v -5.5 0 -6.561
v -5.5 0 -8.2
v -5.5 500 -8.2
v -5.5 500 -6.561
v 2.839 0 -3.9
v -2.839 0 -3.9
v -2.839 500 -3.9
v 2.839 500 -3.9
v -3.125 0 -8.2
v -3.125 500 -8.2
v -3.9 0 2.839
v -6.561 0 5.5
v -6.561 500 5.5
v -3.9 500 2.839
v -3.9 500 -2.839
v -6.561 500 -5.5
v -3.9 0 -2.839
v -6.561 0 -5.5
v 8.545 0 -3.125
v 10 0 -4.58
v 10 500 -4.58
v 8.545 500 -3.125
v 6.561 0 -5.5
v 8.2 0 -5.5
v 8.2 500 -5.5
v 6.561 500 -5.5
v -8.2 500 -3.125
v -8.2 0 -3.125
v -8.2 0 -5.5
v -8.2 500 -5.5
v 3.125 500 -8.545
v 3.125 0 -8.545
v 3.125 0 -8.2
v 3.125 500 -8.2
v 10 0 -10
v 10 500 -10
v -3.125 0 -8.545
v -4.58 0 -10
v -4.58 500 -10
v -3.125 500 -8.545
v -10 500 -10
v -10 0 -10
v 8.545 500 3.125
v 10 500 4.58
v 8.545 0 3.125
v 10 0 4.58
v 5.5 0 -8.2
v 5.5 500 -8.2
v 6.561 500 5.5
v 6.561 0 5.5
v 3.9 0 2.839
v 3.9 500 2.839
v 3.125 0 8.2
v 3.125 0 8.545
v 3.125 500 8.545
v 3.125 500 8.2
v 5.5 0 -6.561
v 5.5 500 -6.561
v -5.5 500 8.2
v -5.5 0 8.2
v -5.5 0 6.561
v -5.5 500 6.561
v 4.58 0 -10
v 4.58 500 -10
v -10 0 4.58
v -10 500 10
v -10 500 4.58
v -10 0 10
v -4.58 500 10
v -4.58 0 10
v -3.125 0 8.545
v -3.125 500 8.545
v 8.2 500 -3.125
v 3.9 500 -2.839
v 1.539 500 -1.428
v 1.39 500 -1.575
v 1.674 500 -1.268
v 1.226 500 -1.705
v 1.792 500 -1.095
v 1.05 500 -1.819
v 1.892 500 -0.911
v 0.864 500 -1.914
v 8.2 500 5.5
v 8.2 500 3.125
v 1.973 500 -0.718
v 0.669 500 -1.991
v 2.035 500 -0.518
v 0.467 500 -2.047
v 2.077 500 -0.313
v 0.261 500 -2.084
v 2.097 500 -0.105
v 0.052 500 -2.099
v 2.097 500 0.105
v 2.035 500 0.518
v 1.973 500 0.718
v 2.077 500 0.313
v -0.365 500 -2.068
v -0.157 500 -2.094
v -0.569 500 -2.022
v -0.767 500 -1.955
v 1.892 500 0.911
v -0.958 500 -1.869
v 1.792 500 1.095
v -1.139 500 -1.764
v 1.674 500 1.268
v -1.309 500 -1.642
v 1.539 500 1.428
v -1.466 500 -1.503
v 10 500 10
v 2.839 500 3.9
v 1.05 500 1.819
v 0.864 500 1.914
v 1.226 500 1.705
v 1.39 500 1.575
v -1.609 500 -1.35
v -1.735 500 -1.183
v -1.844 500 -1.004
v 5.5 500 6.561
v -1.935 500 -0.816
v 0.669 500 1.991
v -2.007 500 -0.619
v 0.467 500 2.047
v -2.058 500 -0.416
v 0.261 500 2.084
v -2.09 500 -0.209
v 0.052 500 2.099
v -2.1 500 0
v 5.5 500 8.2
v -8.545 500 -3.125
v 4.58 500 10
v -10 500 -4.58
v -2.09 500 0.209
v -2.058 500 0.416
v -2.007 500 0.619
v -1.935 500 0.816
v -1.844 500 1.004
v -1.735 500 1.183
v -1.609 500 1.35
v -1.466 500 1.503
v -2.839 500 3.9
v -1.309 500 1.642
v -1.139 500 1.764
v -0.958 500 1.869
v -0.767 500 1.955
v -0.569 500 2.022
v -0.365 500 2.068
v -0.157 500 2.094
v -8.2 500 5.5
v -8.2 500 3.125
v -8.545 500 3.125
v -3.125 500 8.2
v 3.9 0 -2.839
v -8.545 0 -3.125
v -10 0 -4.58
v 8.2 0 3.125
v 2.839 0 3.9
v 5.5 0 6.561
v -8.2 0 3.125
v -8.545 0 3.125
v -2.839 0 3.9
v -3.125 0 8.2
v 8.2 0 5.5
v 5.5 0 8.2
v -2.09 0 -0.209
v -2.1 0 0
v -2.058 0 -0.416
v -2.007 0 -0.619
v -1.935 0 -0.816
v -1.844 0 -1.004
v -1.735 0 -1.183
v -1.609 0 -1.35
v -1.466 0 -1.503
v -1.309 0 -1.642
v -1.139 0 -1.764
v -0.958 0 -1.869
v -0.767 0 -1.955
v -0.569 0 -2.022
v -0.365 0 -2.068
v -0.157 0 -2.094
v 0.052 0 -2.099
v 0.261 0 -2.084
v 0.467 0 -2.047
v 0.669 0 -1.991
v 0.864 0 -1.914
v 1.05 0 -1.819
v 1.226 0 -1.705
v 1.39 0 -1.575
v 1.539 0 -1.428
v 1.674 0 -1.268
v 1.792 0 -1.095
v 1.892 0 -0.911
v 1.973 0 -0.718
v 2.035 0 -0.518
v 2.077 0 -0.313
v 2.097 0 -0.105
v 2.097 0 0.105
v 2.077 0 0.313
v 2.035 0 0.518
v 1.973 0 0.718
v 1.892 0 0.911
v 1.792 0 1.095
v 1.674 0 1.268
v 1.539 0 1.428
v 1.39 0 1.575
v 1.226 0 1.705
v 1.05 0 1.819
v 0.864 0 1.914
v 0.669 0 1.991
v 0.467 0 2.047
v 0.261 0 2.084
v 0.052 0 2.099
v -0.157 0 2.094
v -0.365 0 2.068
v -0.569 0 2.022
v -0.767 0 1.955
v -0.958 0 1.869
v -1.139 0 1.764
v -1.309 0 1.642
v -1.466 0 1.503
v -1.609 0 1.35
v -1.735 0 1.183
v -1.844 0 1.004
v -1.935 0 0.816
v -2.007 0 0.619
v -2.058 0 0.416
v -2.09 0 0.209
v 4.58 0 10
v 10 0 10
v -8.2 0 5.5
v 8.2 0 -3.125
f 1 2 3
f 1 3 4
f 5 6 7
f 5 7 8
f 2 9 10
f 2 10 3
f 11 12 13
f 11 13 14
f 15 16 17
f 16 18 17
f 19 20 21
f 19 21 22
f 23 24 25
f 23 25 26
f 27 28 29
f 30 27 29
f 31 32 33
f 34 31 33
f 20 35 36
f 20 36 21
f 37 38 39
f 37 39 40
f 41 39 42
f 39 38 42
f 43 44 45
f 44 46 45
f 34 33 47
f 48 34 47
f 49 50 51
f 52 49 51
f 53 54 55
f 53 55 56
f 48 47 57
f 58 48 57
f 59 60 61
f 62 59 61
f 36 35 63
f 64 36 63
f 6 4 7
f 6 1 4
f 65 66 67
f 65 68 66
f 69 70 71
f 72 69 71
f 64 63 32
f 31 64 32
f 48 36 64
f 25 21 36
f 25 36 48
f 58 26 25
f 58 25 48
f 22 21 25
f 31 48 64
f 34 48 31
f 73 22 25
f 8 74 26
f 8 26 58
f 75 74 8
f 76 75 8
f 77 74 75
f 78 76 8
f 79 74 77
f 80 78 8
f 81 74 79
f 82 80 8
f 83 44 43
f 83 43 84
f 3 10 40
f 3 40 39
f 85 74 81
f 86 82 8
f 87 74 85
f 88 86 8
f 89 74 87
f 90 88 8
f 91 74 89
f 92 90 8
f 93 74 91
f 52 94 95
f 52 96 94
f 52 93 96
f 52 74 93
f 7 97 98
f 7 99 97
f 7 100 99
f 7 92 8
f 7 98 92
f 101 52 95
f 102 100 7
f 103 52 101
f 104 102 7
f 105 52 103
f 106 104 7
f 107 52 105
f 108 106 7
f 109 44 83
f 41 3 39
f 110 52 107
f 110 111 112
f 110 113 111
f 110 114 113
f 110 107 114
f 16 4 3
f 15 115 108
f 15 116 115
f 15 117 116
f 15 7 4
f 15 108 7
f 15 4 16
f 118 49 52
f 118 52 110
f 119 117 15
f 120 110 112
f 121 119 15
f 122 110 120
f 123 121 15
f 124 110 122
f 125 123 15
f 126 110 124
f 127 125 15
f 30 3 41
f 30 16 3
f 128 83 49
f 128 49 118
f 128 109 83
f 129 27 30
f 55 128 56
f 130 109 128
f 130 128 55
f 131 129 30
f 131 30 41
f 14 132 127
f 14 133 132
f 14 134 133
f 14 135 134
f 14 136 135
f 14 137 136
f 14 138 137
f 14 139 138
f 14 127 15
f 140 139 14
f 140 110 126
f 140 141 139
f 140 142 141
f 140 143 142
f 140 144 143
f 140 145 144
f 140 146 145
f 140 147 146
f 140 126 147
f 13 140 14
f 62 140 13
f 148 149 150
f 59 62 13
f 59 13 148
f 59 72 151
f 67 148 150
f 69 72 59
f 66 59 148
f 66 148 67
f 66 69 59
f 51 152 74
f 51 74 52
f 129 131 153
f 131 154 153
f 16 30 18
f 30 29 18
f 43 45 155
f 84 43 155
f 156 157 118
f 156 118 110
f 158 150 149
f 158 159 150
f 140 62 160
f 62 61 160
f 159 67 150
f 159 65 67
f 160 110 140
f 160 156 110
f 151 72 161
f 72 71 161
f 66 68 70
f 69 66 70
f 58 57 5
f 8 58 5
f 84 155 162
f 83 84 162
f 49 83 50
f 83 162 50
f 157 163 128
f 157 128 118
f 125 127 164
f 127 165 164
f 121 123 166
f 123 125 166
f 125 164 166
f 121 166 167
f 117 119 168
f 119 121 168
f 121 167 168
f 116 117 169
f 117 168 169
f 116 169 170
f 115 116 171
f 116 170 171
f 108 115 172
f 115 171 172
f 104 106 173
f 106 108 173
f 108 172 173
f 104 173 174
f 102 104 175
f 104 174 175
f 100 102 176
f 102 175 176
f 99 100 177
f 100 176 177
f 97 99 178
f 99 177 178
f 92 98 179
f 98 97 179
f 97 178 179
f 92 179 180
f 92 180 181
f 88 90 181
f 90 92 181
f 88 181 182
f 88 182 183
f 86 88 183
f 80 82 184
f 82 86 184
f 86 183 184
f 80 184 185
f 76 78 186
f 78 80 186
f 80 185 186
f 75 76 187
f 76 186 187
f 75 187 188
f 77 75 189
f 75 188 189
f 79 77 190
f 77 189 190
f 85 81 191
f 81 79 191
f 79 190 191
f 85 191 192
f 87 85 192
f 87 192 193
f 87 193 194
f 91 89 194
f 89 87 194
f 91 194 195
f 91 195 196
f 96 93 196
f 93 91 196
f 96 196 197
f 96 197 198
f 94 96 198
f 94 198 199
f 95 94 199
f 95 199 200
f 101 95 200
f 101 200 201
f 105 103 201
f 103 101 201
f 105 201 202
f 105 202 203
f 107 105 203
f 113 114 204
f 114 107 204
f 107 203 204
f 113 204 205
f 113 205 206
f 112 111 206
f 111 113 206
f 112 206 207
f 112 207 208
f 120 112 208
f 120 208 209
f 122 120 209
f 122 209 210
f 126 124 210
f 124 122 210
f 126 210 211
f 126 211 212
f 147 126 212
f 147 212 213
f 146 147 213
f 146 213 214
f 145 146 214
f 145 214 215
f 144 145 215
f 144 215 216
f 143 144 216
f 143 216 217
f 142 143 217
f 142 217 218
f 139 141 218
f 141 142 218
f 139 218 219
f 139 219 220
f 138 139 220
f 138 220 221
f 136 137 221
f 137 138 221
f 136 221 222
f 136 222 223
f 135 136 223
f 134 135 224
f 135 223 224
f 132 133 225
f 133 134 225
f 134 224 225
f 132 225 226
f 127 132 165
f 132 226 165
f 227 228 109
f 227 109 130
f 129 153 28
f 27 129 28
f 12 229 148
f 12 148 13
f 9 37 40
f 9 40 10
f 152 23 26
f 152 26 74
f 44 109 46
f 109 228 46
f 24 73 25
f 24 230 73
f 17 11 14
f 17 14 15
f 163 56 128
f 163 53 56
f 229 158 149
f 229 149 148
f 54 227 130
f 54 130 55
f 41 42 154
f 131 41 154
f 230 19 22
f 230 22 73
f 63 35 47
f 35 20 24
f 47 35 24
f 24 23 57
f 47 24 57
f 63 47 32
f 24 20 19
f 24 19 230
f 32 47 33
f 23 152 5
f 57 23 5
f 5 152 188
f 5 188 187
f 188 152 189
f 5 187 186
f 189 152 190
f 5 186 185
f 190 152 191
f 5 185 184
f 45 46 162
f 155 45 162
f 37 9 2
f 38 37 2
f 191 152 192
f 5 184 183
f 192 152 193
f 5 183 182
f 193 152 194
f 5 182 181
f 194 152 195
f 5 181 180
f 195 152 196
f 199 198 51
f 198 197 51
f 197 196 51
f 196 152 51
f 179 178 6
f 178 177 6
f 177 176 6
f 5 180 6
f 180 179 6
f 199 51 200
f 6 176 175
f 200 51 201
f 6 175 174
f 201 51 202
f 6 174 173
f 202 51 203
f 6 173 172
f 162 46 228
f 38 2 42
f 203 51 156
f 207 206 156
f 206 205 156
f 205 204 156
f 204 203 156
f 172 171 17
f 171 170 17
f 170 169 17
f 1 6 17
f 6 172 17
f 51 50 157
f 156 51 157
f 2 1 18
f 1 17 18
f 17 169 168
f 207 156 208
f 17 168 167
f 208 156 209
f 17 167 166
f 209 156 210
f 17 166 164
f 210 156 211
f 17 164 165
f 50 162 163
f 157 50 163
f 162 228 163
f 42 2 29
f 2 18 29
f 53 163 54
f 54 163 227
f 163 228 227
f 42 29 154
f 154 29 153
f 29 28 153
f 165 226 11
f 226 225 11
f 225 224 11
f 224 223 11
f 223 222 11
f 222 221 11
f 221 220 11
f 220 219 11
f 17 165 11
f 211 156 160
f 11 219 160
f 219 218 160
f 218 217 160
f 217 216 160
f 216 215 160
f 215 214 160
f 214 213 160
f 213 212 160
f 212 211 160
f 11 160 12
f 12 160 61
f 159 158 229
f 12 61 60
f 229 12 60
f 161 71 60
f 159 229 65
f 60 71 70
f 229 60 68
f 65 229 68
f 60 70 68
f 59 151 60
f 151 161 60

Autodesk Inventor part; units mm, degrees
sketch "Sketch1" plane through (0, 0, 0) normal (0, 1, 0) x (-1, 0, 0)
  circle A0 centre (0, 0) radius 2.1
  line L0 (10, 10) -> (-10, 10) construction
  line L1 (-10, 10) -> (-10, -10) construction
  line L2 (-10, -10) -> (10, -10)
  line L3 (10, -10) -> (10, 10) construction
  line L4 (10, 10) -> (-10, -10) construction
  line L5 (-10, 10) -> (10, -10) construction
  line L6 (8.2, 10) -> (8.2, -10) construction
  line L7 (3.9, 10) -> (3.9, -10) construction
  line L8 (8.2, 3.125) -> (8.2, -3.125) construction
  line L9 (10, 4.58) -> (10, -4.58) construction
  line L10 (8.2, 5.5) -> (8.2, -5.5) construction
  line L11 (3.3697, 4.4303) -> (4.4303, 3.3697) construction
  line L12 (10, 10) -> (10, 4.58)
  line L13 (10, 4.58) -> (8.545, 3.125)
  line L14 (8.545, 3.125) -> (8.2, 3.125)
  line L15 (8.2, 3.125) -> (8.2, 5.5)
  line L16 (14, 0) -> (-14, 0) construction
  line L17 (8.2, 5.5) -> (6.5607, 5.5)
  line L18 (6.5607, 5.5) -> (3.9, 2.8393)
  line L19 (3.9, 2.8393) -> (3.9, 0)
  line L20 (10, -10) -> (10, -4.58)
  line L21 (10, -4.58) -> (8.545, -3.125)
  line L22 (8.545, -3.125) -> (8.2, -3.125)
  line L23 (8.2, -3.125) -> (8.2, -5.5)
  line L24 (8.2, -5.5) -> (6.5607, -5.5)
  line L25 (6.5607, -5.5) -> (3.9, -2.8393)
  line L26 (3.9, -2.8393) -> (3.9, 0)
  line L27 (-10, 10) -> (-4.58, 10)
  line L28 (-4.58, 10) -> (-3.125, 8.545)
  line L29 (-3.125, 8.2) -> (-5.5, 8.2)
  line L30 (-5.5, 8.2) -> (-5.5, 6.5607)
  line L31 (-5.5, 6.5607) -> (-2.8393, 3.9)
  line L32 (-2.8393, 3.9) -> (0, 3.9)
  line L33 (2.8393, 3.9) -> (0, 3.9)
  line L34 (5.5, 6.5607) -> (2.8393, 3.9)
  line L35 (5.5, 8.2) -> (5.5, 6.5607)
  line L36 (3.125, 8.2) -> (5.5, 8.2)
  line L37 (3.125, 8.545) -> (3.125, 8.2)
  line L38 (4.58, 10) -> (3.125, 8.545)
  line L39 (-3.125, 8.545) -> (-3.125, 8.2)
  line L40 (10, 10) -> (4.58, 10)
  line L41 (-10, -10) -> (-10, -4.58)
  line L42 (-10, -4.58) -> (-8.545, -3.125)
  line L43 (-8.2, -3.125) -> (-8.2, -5.5)
  line L44 (-8.2, -5.5) -> (-6.5607, -5.5)
  line L45 (-6.5607, -5.5) -> (-3.9, -2.8393)
  line L46 (-3.9, -2.8393) -> (-3.9, 0)
  line L47 (-3.9, 2.8393) -> (-3.9, 0)
  line L48 (-6.5607, 5.5) -> (-3.9, 2.8393)
  line L49 (-8.2, 5.5) -> (-6.5607, 5.5)
  line L50 (-8.2, 3.125) -> (-8.2, 5.5)
  line L51 (-8.545, 3.125) -> (-8.2, 3.125)
  line L52 (-10, 4.58) -> (-8.545, 3.125)
  line L53 (-8.545, -3.125) -> (-8.2, -3.125)
  line L54 (-10, 10) -> (-10, 4.58)
  line L55 (10, -10) -> (4.58, -10) construction
  line L56 (4.58, -10) -> (3.125, -8.545)
  line L57 (3.125, -8.2) -> (5.5, -8.2)
  line L58 (5.5, -8.2) -> (5.5, -6.5607)
  line L59 (5.5, -6.5607) -> (2.8393, -3.9)
  line L60 (2.8393, -3.9) -> (0, -3.9)
  line L61 (-2.8393, -3.9) -> (0, -3.9)
  line L62 (-5.5, -6.5607) -> (-2.8393, -3.9)
  line L63 (-5.5, -8.2) -> (-5.5, -6.5607)
  line L64 (-3.125, -8.2) -> (-5.5, -8.2)
  line L65 (-3.125, -8.545) -> (-3.125, -8.2)
  line L66 (-4.58, -10) -> (-3.125, -8.545)
  line L67 (3.125, -8.545) -> (3.125, -8.2)
  line L68 (-10, -10) -> (-4.58, -10) construction
  line L69 (5.5, -6.5607) -> (6.2393, -7.3)
  line L70 (6.2393, -7.3) -> (8.2, -7.3)
  line L71 (0, -10) -> (0, -9) construction
  line L72 (-5.5, -6.5607) -> (-6.2393, -7.3)
  line L73 (-6.2393, -7.3) -> (-8.2, -7.3)
  line L74 (8.2, -7.3) -> (8.2, -10)
  line L75 (-8.2, -7.3) -> (-8.2, -10)
  circle A1 centre (0, -20) radius 2.1
  line L76 (10, -30) -> (10, -24.58)
  line L77 (10, -24.58) -> (8.545, -23.125)
  line L78 (8.545, -23.125) -> (8.2, -23.125)
  line L79 (8.2, -23.125) -> (8.2, -25.5)
  line L80 (8.2, -25.5) -> (6.5607, -25.5)
  line L81 (6.5607, -25.5) -> (3.9, -22.8393)
  line L82 (3.9, -22.8393) -> (3.9, -20)
  line L83 (10, -10) -> (10, -15.42)
  line L84 (10, -15.42) -> (8.545, -16.875)
  line L85 (8.2, -16.875) -> (8.2, -14.5)
  line L86 (8.2, -14.5) -> (6.5607, -14.5)
  line L87 (6.5607, -14.5) -> (3.9, -17.1607)
  line L88 (3.9, -17.1607) -> (3.9, -20)
  line L89 (-10, -30) -> (-4.58, -30)
  line L90 (-4.58, -30) -> (-3.125, -28.545)
  line L91 (-3.125, -28.2) -> (-5.5, -28.2)
  line L92 (-5.5, -28.2) -> (-5.5, -26.5607)
  line L93 (-5.5, -26.5607) -> (-2.8393, -23.9)
  line L94 (-2.8393, -23.9) -> (0, -23.9)
  line L95 (2.8393, -23.9) -> (0, -23.9)
  line L96 (5.5, -26.5607) -> (2.8393, -23.9)
  line L97 (5.5, -28.2) -> (5.5, -26.5607)
  line L98 (3.125, -28.2) -> (5.5, -28.2)
  line L99 (3.125, -28.545) -> (3.125, -28.2)
  line L100 (4.58, -30) -> (3.125, -28.545)
  line L101 (-3.125, -28.545) -> (-3.125, -28.2)
  line L102 (10, -30) -> (4.58, -30)
  line L103 (-10, -10) -> (-10, -15.42)
  line L104 (-10, -15.42) -> (-8.545, -16.875)
  line L105 (-8.2, -16.875) -> (-8.2, -14.5)
  line L106 (-8.2, -14.5) -> (-6.5607, -14.5)
  line L107 (-6.5607, -14.5) -> (-3.9, -17.1607)
  line L108 (-3.9, -17.1607) -> (-3.9, -20)
  line L109 (-3.9, -22.8393) -> (-3.9, -20)
  line L110 (-6.5607, -25.5) -> (-3.9, -22.8393)
  line L111 (-8.2, -25.5) -> (-6.5607, -25.5)
  line L112 (-8.2, -23.125) -> (-8.2, -25.5)
  line L113 (-8.545, -23.125) -> (-8.2, -23.125)
  line L114 (-10, -24.58) -> (-8.545, -23.125)
  line L115 (-8.545, -16.875) -> (-8.2, -16.875)
  line L116 (-10, -30) -> (-10, -24.58)
  line L117 (5.5, -13.4393) -> (2.8393, -16.1)
  line L118 (2.8393, -16.1) -> (0, -16.1)
  line L119 (-2.8393, -16.1) -> (0, -16.1)
  line L120 (-5.5, -13.4393) -> (-2.8393, -16.1)
  line L121 (5.5, -13.4393) -> (6.2393, -12.7)
  line L122 (6.2393, -12.7) -> (8.2, -12.7)
  line L123 (-5.5, -13.4393) -> (-6.2393, -12.7)
  line L124 (-6.2393, -12.7) -> (-8.2, -12.7)
  line L125 (8.2, -12.7) -> (8.2, -10)
  line L126 (-8.2, -12.7) -> (-8.2, -10)
  line L127 (8.545, -16.875) -> (8.2, -16.875)
  point P0 (10, 0)
  point P1 (8.2, 0)
  point P2 (3.9, 3.9)
  point P3 (-3.3697, 4.4303)
  point P4 (-4.4303, -3.3697)
  point P5 (3.3697, -4.4303)
  dimension "d0" = 4.2
  dimension "d1" = 20
  dimension "d2" = 20
  dimension "d3" = 1.8
  dimension "d4" = 4.3
  dimension "d5" = 6.25
  dimension "d6" = 9.16
  dimension "d7" = 11
  dimension "d8" = 1.5
  dimension "d9" = 45
  dimension "d12" = 360
  dimension "d17" = 1.8
  dimension "d18" = 1
extrude "Extrusion1" add sketch "Sketch1" along normal blind 500 contours L41 L42 L53 L43 L44 L45 L46 L47 L48 L49 L50 L51 L52 L54 L27 L28 L39 L29 L30 L31 L32 L33 L34 L35 L36 L37 L38 L40 L12 L13 L14 L15 L17 L18 L19 L26 L25 L24 L23 L22 L21 L20 L2 L74 L70 L69 L59 L60 L61 L62 L72 L73 L75 | L75 L73 L72 L63 L64 L65 L66 L2 | L56 L67 L57 L58 L69 L70 L74 L2
ref_plane "Work Plane1" through (-2.8393, 0, 0) normal (0, 0, -1) x (-1, 0, 0)
ref_plane "Work Plane2" through (0, 0, 4.58) normal (1, 0, 0) x (0, 0, -1)
ref_plane "Work Plane3" through (0, 250, 0) normal (0, 1, 0) x (1, 0, 0)
ref_plane "Work Plane5" through (0, 250, 0) normal (0, -1, 0) x (1, 0, 0)
ref_plane "Work Plane7" through (0, 0, 4.58) normal (1, 0, 0) x (0, 0, -1)
properties part number "VSLOT 2040 Extrusion x 1m" material "Aluminum 6061"
